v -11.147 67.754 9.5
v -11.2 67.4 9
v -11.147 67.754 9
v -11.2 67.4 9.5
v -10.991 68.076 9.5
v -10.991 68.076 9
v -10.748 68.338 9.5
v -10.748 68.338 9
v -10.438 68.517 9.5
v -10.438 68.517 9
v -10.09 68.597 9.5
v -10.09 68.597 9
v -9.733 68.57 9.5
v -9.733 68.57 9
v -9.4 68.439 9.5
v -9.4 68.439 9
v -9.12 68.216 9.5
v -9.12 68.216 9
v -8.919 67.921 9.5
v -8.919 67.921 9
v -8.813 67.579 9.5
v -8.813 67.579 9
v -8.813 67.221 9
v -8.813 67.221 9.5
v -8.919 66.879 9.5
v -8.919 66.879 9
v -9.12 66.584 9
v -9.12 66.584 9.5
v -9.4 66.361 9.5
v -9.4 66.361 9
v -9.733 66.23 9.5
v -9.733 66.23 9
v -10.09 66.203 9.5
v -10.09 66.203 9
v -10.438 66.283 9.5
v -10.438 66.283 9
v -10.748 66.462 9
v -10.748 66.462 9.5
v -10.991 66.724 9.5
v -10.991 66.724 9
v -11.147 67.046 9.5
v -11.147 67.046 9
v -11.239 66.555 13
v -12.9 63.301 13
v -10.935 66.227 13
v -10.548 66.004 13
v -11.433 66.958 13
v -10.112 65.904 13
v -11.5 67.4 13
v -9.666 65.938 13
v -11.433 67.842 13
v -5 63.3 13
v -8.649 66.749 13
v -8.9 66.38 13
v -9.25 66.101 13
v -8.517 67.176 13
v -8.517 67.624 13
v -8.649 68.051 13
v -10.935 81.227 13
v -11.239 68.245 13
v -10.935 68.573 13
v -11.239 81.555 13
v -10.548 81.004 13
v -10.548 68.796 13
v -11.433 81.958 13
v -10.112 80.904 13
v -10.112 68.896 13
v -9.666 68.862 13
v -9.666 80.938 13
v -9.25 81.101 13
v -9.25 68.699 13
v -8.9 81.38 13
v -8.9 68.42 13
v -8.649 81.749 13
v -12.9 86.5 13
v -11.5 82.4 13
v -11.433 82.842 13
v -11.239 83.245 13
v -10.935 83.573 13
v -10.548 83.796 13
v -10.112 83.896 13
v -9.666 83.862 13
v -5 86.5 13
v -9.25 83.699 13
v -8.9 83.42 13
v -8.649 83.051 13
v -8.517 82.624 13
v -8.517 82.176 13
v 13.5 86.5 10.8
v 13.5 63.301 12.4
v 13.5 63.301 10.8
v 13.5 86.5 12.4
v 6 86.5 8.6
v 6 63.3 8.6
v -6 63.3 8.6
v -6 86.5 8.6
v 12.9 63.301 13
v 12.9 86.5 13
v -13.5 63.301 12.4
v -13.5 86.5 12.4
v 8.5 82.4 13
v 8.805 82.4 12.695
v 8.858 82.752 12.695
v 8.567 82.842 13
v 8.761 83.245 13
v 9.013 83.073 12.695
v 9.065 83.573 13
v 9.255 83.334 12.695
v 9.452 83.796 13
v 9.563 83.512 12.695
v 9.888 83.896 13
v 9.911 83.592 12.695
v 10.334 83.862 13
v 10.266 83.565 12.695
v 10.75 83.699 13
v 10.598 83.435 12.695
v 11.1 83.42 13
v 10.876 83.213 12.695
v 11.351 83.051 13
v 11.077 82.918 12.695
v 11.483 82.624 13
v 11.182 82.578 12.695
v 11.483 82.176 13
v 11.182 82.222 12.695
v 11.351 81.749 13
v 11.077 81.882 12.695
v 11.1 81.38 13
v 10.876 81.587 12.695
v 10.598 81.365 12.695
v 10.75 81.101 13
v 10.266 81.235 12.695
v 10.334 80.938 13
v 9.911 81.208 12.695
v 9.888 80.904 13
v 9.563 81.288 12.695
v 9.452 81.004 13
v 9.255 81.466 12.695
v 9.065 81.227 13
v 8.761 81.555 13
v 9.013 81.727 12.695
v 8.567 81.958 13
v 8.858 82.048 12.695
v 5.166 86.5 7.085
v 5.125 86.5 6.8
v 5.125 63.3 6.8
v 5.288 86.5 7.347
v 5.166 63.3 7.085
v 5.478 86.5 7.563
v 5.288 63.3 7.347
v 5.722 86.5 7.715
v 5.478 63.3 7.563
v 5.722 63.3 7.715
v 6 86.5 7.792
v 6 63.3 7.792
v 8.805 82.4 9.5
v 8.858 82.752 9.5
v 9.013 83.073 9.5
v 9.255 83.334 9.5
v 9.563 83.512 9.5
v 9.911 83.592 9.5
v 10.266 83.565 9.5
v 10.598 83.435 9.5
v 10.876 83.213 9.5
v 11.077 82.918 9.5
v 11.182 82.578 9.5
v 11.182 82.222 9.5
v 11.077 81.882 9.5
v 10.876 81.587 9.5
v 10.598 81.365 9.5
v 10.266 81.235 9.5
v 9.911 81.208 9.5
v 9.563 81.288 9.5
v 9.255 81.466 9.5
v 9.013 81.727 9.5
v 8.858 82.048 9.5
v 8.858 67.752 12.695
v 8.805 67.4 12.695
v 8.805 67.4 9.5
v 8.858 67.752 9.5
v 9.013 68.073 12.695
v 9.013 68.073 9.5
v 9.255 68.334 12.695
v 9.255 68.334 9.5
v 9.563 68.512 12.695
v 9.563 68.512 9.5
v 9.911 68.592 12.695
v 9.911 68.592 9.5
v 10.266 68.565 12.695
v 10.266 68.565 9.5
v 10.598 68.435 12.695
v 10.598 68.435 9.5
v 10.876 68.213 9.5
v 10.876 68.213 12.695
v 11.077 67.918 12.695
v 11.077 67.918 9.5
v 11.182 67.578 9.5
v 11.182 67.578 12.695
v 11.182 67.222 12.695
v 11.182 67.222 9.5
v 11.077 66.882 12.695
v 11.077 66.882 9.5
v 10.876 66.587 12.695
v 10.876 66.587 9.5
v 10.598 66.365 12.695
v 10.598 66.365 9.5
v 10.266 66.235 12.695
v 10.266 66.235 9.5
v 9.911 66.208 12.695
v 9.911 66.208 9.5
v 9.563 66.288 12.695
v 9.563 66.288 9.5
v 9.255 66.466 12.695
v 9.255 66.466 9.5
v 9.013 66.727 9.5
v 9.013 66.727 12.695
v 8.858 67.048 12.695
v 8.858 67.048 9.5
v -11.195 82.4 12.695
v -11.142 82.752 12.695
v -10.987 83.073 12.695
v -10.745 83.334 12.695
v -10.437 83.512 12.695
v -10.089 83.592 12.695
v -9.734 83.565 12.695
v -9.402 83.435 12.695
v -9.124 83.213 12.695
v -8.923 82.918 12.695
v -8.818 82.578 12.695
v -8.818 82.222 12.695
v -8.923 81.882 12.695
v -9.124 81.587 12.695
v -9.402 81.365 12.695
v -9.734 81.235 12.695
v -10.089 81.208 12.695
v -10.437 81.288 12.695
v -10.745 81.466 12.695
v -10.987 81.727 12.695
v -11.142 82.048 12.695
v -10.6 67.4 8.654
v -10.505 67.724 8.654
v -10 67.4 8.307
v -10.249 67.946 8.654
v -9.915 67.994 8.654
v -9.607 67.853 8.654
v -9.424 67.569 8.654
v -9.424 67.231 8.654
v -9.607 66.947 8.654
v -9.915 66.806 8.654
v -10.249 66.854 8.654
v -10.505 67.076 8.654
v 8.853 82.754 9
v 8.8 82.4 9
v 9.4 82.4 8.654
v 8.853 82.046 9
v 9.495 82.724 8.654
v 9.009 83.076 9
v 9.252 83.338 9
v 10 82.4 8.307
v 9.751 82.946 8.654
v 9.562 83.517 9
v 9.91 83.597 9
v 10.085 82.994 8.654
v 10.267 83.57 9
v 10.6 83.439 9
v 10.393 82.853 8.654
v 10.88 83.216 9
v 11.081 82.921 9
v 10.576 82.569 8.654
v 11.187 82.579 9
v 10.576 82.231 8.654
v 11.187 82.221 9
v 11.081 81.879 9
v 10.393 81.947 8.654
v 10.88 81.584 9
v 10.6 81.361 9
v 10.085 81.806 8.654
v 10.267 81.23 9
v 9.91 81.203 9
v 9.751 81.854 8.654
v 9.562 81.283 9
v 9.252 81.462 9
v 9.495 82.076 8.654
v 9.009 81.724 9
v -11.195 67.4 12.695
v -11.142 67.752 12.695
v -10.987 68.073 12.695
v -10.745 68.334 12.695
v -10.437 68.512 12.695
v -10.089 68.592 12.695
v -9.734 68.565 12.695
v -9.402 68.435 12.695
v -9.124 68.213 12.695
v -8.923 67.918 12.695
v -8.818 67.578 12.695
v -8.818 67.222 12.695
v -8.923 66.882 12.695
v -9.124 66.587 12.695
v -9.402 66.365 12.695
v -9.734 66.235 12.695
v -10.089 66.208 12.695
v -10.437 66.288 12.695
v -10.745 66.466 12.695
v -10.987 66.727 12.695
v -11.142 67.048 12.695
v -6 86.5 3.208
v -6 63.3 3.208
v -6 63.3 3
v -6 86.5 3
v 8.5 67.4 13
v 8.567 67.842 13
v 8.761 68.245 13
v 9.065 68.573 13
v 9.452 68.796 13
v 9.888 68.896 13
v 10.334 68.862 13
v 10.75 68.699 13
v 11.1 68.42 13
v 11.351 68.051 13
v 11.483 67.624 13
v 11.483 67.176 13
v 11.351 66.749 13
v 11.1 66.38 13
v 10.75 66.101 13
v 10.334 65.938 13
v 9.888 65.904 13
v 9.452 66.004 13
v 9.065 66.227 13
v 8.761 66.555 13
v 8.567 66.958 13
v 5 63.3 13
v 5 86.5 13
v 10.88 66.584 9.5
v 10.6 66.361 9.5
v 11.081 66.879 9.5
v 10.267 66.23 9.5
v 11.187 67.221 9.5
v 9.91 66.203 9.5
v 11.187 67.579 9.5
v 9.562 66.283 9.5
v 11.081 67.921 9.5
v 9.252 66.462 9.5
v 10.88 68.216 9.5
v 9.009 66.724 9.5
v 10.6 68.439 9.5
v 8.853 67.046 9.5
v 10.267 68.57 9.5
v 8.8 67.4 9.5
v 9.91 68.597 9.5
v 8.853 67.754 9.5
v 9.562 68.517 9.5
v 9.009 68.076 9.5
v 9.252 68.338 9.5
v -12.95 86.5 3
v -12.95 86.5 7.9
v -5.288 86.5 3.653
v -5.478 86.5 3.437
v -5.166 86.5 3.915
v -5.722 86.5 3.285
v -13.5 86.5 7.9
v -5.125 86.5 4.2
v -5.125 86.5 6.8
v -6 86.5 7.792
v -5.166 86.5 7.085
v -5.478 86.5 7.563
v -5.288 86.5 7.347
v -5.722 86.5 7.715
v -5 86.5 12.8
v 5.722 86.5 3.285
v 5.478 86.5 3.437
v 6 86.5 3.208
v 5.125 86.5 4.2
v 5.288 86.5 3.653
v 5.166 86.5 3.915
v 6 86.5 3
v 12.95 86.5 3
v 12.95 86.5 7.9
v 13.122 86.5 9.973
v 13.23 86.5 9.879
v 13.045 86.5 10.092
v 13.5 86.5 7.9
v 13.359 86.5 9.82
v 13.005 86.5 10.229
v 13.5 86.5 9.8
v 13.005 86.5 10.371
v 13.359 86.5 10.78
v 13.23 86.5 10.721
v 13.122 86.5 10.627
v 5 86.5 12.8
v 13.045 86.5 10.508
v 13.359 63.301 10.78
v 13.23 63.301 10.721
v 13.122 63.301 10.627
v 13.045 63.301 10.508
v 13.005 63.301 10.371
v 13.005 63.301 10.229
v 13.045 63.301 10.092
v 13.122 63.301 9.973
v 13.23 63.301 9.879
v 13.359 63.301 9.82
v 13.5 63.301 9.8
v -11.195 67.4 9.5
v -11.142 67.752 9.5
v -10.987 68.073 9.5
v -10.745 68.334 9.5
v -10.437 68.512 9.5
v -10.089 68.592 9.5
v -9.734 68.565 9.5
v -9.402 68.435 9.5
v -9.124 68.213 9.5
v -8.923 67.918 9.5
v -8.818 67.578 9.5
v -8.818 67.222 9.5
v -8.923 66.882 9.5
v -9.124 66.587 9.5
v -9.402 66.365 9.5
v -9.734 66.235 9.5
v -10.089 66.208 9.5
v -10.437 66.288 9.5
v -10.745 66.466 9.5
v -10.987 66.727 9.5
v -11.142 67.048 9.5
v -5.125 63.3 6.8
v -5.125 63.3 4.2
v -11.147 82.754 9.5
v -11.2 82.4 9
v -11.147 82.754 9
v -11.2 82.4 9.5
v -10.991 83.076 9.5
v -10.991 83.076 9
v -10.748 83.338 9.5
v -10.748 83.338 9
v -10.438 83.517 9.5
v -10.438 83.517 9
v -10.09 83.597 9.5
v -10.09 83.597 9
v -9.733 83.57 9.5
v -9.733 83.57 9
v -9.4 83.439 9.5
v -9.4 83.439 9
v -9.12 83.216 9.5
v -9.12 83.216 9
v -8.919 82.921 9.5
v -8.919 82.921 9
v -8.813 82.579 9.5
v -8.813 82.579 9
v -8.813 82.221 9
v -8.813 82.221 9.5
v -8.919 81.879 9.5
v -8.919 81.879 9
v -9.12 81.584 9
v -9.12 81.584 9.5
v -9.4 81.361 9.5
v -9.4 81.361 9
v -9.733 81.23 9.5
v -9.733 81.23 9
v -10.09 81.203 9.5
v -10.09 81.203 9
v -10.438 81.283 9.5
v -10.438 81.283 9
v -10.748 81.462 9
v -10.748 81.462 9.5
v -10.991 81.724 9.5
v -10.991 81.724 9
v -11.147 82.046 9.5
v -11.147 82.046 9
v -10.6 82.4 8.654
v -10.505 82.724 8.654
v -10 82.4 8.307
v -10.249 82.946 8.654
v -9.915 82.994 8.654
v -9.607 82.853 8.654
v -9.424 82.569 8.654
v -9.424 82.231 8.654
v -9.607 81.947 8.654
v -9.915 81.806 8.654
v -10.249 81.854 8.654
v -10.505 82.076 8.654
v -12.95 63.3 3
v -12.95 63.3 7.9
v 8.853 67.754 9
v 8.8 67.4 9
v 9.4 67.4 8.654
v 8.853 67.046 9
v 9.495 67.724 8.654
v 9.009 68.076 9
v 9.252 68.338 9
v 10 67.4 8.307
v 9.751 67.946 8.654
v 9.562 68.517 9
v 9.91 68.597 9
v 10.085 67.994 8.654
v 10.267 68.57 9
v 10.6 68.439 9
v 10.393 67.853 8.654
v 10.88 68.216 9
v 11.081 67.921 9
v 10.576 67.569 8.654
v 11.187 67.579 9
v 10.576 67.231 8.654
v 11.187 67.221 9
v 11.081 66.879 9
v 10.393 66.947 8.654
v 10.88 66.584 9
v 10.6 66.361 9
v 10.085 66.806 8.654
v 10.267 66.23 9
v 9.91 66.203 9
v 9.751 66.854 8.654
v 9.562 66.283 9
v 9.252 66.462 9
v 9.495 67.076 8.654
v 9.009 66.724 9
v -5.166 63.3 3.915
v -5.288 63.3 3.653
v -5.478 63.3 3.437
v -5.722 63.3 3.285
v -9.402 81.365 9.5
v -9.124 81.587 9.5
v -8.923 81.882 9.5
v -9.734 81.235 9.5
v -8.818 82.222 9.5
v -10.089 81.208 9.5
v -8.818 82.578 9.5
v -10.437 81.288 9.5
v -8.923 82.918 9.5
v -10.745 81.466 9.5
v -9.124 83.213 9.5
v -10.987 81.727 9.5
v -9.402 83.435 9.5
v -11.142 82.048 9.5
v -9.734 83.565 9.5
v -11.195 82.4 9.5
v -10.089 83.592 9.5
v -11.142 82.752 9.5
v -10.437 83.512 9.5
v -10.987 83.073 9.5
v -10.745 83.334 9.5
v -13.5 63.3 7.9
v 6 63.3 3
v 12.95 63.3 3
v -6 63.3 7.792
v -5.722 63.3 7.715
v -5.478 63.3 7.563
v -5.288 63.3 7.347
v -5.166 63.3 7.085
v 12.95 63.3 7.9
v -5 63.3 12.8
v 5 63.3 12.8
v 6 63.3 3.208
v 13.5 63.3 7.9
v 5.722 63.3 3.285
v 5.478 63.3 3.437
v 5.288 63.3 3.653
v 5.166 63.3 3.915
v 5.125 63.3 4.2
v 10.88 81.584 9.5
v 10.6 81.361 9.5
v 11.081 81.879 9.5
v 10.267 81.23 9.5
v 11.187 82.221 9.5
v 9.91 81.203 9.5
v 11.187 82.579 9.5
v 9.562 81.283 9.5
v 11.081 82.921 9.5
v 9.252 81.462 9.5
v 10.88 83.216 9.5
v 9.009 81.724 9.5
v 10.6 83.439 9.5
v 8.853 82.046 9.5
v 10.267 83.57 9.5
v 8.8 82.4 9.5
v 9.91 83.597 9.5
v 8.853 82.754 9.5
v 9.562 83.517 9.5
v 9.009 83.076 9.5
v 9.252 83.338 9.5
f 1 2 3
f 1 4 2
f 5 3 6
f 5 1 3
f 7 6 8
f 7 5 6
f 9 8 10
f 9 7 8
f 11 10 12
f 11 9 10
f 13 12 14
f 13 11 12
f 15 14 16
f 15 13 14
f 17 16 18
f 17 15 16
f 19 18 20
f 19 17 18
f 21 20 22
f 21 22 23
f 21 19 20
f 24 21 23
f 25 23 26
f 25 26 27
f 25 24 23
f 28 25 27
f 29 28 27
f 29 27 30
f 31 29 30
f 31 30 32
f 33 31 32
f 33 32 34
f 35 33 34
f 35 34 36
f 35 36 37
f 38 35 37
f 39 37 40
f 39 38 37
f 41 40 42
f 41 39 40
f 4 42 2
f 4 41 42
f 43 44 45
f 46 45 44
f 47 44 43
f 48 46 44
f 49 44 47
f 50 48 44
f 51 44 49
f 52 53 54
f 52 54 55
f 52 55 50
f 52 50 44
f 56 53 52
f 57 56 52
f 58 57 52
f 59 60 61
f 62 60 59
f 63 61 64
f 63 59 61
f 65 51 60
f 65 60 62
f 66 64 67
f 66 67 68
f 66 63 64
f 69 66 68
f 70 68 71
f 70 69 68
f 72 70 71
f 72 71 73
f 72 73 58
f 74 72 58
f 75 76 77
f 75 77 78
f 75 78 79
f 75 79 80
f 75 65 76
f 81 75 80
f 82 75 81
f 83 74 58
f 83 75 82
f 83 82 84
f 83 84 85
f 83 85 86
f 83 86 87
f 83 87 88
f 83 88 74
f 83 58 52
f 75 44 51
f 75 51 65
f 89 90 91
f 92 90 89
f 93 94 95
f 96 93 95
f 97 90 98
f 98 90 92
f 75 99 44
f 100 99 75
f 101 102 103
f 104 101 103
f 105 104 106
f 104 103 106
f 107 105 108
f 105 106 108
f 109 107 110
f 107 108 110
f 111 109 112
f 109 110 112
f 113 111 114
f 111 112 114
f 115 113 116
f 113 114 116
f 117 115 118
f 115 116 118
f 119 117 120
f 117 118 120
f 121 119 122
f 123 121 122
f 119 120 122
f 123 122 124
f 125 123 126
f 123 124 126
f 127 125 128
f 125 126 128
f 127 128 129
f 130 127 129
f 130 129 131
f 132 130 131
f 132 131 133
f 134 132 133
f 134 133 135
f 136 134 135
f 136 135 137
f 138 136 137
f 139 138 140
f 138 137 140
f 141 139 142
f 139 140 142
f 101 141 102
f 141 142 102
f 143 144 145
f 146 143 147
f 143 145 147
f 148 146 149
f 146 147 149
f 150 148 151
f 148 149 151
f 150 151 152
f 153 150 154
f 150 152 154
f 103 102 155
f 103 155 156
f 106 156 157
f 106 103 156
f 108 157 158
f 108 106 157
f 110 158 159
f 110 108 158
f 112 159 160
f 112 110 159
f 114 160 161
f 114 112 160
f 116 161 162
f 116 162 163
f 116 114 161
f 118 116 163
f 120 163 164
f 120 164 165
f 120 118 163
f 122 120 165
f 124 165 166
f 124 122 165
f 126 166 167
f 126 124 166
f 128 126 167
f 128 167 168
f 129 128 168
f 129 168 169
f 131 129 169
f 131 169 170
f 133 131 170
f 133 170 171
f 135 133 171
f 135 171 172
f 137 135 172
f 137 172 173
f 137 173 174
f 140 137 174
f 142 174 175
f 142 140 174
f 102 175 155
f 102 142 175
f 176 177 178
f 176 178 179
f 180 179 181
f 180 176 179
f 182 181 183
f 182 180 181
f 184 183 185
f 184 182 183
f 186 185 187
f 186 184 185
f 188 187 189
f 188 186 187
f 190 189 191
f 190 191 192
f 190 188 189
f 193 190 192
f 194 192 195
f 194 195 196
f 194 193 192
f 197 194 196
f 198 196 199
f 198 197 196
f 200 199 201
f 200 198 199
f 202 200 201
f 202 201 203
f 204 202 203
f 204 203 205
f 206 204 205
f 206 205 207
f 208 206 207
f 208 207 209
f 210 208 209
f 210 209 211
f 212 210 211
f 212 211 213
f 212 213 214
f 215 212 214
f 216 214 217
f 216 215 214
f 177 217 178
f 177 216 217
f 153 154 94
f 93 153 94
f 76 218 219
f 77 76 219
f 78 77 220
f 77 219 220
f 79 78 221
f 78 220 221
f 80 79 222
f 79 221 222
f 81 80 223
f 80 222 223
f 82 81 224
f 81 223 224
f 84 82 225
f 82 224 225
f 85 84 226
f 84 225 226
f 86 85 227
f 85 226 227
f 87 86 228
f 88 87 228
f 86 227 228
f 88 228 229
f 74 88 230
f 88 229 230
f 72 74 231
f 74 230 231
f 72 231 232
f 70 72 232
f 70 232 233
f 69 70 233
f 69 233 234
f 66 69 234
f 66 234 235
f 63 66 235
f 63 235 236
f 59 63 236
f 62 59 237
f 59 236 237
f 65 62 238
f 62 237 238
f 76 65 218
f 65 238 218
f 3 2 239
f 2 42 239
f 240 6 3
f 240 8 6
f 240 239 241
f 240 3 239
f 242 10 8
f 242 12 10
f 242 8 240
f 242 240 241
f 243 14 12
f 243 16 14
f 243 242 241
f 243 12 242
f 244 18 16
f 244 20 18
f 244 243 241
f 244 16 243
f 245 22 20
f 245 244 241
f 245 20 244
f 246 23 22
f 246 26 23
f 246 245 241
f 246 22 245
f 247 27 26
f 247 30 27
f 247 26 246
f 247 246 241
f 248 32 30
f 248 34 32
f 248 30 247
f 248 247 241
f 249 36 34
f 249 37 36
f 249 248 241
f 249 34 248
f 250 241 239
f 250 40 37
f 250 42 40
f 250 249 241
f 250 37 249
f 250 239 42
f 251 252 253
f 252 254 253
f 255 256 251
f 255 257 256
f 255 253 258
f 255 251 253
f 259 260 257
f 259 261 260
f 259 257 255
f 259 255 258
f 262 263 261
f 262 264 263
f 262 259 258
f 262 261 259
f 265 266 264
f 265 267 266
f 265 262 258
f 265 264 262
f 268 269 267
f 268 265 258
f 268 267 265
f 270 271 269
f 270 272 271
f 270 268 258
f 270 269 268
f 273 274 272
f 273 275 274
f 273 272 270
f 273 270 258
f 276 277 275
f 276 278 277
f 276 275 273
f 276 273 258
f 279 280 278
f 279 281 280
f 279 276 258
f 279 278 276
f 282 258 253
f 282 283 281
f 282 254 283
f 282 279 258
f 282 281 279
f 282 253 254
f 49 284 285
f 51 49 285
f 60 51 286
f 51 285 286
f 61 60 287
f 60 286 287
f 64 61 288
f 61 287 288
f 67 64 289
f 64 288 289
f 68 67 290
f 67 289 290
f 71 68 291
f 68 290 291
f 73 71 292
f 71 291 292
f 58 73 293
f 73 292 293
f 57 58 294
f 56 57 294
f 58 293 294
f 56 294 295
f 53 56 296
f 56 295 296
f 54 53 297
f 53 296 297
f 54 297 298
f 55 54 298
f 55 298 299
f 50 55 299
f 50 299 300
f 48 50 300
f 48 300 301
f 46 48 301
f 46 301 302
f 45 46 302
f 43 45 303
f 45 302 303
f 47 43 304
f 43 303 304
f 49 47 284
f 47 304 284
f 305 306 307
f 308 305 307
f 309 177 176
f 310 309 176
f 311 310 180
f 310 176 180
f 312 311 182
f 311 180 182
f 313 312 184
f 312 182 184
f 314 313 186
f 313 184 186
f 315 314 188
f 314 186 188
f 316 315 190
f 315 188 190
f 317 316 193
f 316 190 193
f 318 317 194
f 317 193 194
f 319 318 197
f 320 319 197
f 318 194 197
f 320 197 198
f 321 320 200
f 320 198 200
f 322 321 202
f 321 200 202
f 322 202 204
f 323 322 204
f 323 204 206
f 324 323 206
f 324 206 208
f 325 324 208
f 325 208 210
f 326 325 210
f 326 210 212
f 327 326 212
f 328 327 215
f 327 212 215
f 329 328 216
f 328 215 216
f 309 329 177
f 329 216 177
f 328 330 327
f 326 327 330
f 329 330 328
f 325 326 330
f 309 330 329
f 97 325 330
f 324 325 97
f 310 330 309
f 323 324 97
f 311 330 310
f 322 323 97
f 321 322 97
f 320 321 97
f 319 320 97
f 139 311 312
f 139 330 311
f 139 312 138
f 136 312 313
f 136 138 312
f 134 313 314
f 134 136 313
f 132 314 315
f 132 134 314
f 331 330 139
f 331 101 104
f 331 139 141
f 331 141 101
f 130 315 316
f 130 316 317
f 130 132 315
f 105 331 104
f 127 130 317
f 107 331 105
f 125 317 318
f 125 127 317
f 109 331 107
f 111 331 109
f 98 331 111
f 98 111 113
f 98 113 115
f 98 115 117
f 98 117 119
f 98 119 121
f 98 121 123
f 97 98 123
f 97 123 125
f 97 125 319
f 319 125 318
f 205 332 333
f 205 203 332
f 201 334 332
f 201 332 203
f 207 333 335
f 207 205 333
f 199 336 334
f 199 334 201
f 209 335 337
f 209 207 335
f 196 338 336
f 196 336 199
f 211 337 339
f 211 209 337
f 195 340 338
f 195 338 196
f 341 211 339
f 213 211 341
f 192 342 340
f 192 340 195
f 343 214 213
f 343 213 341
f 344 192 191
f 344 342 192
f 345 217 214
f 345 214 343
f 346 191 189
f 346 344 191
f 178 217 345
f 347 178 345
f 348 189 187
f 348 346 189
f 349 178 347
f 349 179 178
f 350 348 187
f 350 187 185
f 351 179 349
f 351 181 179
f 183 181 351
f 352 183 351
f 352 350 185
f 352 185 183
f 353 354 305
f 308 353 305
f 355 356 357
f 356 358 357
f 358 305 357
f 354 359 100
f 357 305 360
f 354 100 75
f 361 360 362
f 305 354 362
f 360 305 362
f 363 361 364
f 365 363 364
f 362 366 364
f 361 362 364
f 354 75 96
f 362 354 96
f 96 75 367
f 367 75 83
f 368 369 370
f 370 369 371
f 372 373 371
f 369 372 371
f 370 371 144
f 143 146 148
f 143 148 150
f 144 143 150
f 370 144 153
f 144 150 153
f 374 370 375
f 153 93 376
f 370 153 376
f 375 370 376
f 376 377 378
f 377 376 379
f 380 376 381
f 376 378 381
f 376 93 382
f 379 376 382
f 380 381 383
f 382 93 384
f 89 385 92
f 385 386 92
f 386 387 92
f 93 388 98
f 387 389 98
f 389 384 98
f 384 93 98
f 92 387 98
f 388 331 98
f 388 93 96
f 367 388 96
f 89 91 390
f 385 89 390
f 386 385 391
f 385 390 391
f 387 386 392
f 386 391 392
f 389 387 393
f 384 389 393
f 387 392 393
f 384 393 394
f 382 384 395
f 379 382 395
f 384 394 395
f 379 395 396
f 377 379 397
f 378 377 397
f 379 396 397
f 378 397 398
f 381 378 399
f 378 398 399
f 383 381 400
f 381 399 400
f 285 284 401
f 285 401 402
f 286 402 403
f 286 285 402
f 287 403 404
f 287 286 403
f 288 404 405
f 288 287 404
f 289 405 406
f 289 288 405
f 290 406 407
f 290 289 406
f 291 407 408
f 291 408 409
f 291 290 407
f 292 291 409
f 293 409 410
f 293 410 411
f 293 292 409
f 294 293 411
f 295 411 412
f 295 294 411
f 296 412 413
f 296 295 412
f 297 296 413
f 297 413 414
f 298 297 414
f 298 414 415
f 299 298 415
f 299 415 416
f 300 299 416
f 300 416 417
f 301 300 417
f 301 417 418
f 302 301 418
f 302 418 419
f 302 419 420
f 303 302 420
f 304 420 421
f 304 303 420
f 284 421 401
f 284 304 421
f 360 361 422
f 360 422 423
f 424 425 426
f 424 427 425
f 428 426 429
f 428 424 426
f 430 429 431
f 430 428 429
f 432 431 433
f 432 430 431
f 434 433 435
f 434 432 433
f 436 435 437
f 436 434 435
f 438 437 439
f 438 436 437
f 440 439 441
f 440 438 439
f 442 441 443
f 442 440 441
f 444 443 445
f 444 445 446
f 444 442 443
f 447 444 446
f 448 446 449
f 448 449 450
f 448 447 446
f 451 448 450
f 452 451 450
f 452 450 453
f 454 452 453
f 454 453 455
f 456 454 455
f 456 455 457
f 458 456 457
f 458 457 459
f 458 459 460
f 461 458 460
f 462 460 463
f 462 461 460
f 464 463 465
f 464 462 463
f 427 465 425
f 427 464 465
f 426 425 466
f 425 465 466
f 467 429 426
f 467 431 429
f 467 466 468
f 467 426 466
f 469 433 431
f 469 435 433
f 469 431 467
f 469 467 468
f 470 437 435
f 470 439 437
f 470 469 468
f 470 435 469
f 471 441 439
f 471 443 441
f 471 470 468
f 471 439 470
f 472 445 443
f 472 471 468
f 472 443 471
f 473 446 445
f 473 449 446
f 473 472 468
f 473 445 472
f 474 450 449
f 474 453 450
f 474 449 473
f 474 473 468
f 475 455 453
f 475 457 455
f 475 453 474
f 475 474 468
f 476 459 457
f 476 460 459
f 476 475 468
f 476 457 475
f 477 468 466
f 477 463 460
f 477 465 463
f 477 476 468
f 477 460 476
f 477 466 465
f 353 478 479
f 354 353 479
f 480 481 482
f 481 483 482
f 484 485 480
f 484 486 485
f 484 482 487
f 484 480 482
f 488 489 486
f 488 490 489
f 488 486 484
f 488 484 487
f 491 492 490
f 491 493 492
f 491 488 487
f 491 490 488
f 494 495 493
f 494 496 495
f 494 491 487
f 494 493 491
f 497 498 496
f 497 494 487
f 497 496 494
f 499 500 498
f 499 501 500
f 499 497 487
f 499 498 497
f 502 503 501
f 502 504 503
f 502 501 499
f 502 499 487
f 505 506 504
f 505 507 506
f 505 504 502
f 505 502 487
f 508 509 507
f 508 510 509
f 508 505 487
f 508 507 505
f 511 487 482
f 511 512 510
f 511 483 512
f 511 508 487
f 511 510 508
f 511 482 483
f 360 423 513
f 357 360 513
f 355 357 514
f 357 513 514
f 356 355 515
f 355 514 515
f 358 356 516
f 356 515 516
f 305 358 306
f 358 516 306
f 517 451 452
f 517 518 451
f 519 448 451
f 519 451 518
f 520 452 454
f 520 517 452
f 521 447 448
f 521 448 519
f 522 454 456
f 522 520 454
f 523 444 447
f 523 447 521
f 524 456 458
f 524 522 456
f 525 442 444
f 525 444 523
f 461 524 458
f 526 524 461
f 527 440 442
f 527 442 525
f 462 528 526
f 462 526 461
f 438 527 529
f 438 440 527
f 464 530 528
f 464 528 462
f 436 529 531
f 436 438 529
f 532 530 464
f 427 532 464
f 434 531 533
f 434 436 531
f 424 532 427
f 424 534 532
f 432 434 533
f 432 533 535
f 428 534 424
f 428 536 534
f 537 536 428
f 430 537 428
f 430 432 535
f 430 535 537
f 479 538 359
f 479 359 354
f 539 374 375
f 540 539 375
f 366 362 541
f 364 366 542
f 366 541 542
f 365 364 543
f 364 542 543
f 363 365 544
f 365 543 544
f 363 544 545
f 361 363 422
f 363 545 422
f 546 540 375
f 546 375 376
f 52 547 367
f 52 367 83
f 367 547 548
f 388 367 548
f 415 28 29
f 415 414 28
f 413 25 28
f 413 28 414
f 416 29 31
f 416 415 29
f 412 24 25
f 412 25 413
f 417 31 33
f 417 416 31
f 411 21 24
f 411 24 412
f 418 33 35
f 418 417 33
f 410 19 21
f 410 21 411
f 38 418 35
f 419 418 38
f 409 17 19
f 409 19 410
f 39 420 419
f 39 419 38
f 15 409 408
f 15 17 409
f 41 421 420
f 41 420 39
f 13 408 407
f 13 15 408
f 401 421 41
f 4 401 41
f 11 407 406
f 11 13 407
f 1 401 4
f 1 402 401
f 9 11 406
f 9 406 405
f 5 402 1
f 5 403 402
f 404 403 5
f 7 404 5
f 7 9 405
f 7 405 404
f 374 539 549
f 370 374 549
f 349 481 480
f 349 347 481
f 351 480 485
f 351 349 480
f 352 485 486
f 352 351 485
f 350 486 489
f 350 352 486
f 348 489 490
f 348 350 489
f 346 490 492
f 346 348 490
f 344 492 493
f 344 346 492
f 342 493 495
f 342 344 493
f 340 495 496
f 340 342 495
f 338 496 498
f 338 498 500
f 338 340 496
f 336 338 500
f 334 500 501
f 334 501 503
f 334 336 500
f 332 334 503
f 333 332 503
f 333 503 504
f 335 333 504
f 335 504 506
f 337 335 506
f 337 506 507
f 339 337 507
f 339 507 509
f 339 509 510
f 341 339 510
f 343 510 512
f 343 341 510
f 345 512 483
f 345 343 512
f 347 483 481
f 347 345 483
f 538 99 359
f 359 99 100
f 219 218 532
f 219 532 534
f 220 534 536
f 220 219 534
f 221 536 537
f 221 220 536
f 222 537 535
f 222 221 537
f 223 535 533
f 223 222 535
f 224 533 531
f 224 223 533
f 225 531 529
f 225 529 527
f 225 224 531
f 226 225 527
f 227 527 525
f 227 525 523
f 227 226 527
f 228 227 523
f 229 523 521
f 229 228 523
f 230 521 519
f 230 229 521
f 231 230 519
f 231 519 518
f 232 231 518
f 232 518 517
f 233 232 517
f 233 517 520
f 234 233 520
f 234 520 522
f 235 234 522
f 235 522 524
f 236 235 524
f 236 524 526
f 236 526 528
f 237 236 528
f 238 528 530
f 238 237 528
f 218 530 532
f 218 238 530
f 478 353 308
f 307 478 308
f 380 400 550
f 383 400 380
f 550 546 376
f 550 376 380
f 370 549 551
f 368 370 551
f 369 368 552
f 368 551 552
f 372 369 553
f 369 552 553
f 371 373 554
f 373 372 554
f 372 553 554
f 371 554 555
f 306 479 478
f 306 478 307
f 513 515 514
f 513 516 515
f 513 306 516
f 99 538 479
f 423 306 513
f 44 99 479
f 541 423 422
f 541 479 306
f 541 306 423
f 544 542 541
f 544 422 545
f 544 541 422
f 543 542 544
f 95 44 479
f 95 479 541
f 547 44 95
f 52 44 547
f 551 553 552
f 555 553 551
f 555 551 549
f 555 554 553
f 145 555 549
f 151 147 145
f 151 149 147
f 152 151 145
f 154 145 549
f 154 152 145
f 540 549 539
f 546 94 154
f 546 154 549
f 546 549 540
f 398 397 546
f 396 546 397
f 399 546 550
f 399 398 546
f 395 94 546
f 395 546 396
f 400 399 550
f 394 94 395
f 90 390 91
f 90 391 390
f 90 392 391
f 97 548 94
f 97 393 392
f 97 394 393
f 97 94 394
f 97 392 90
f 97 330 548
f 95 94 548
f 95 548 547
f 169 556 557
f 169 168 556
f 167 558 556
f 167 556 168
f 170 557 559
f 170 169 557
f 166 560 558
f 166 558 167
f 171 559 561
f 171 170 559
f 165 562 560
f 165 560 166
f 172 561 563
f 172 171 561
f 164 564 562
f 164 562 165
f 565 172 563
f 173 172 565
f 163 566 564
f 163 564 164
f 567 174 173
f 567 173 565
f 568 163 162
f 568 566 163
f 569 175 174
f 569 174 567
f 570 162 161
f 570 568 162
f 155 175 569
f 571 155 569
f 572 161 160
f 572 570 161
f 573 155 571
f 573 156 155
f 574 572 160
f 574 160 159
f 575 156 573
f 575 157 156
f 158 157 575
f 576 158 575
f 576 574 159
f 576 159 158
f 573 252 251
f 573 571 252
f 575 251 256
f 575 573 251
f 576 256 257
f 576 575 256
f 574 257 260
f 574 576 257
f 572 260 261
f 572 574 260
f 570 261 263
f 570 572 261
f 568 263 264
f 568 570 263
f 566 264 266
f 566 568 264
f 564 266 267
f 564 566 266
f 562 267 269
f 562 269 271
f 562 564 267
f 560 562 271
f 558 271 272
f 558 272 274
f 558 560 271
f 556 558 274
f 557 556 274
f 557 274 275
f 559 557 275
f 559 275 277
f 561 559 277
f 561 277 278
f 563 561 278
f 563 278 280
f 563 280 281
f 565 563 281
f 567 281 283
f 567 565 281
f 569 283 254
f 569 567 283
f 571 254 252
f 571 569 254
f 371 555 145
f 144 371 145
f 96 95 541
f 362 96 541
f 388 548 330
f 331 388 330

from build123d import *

# Parameters (mm, degrees)
CROQUIS1_W                    = 27
CROQUIS1_H                    = 23.199
SALIENTE_EXTRUIR1_DEPTH       = 10
CORTAR_EXTRUIR1_DEPTH         = 30.823541054
CROQUIS3_W                    = 0.55
CROQUIS3_H                    = 4.9
CORTAR_EXTRUIR2_DEPTH         = 30.823541054
CORTAR_EXTRUIR3_DEPTH         = 30.823541054
CORTAR_EXTRUIR4_DEPTH         = 23.199
CROQUIS6_W                    = 0.55
CROQUIS6_H                    = 4.9
CORTAR_EXTRUIR5_DEPTH         = 30.823541054
CROQUIS7_W                    = 10
CROQUIS7_H                    = 0.2
CORTAR_EXTRUIR6_DEPTH         = 30.823541054
DI_METRO_DE_TALADRO_1_0_1_1_D = 1
CHAFL_N1_SIZE                 = 0.305
CHAFL_N2_SIZE                 = 0.6


with BuildPart() as part:
    # Croquis1 → Saliente-Extruir1 (new body)
    with BuildSketch(Plane.XY.offset(13)):
        with Locations((0, 74.9)):
            Rectangle(CROQUIS1_W, CROQUIS1_H)
    extrude(amount=-SALIENTE_EXTRUIR1_DEPTH)

    # Croquis2 → Cortar-Extruir1 (cut, through all)
    with BuildSketch(Plane.XZ.offset(-63.3005)):
        with BuildLine():
            Line((-5.125, 3), (5.125, 3))
            Line((5.125, 3), (5.125, 6.799999997))
            ThreePointArc((5.125, 6.799999997), (5.375, 7.461437825), (6, 7.79215674))
            Line((6, 7.79215674), (6, 8.6))
            Line((6, 8.6), (-6, 8.6))
            Line((-6, 8.6), (-6, 7.79215674))
            ThreePointArc((-6, 7.79215674), (-5.375, 7.461437828), (-5.125, 6.800000001))
            Line((-5.125, 6.800000001), (-5.125, 3))
        make_face()
    extrude(amount=-CORTAR_EXTRUIR1_DEPTH, mode=Mode.SUBTRACT)

    # Croquis3 → Cortar-Extruir2 (cut, through all)
    with BuildSketch(Plane.XZ.offset(-63.3005)):
        with Locations((13.225, 5.45)):
            Rectangle(CROQUIS3_W, CROQUIS3_H)
    extrude(amount=-CORTAR_EXTRUIR2_DEPTH, mode=Mode.SUBTRACT)

    # Croquis4 → Cortar-Extruir3 (cut, through all)
    with BuildSketch(Plane.XZ.offset(-63.3005)):
        with BuildLine():
            Line((5.125, 4.199999999), (5.125, 3))
            Line((5.125, 3), (6, 3))
            Line((6, 3), (6, 3.20784326))
            ThreePointArc((6, 3.20784326), (5.375, 3.538562172), (5.125, 4.199999999))
        make_face()
    extrude(amount=-CORTAR_EXTRUIR3_DEPTH, mode=Mode.SUBTRACT)

    # Croquis5 → Cortar-Extruir4 (cut)
    with BuildSketch(Plane.XZ.offset(-63.3005)):
        with BuildLine():
            Line((-6, 3.20784326), (-6, 3))
            Line((-6, 3), (-5.125, 3))
            Line((-5.125, 3), (-5.125, 4.200000003))
            ThreePointArc((-5.125, 4.200000003), (-5.375, 3.538562175), (-6, 3.20784326))
        make_face()
    extrude(amount=-CORTAR_EXTRUIR4_DEPTH, mode=Mode.SUBTRACT)

    # Croquis6 → Cortar-Extruir5 (cut, through all)
    with BuildSketch(Plane.XZ.offset(-63.3005)):
        with Locations((-13.225, 5.45)):
            Rectangle(CROQUIS6_W, CROQUIS6_H)
    extrude(amount=-CORTAR_EXTRUIR5_DEPTH, mode=Mode.SUBTRACT)

    # Croquis7 → Cortar-Extruir6 (cut, through all)
    with BuildSketch(Plane.XZ.offset(-63.3005)):
        with Locations((0, 12.9)):
            Rectangle(CROQUIS7_W, CROQUIS7_H)
    extrude(amount=-CORTAR_EXTRUIR6_DEPTH, mode=Mode.SUBTRACT)

    # Croquis8 → Cortar-Revolución1 (revolve, cut)
    with BuildSketch(Plane.XZ.offset(-67.4), mode=Mode.PRIVATE) as cortar_revoluci_n1_sk:
        Polygon((-8.805, 13), (-10, 13), (-10, 8.307179677), (-8.8, 9), (-8.8, 9.5), (-8.805, 9.5), align=None)
    revolve(cortar_revoluci_n1_sk.sketch.rotate(Axis((-10, 67.4, 13.000025), (0, 0, -1)), 180), axis=Axis((-10, 67.4, 13.000025), (0, 0, -1)), mode=Mode.SUBTRACT)

    # Croquis9 → Cortar-Revolución2 (revolve, cut)
    with BuildSketch(Plane.XZ.offset(-82.4), mode=Mode.PRIVATE) as cortar_revoluci_n2_sk:
        Polygon((-8.805, 13), (-10, 13), (-10, 8.307179677), (-8.8, 9), (-8.8, 9.5), (-8.805, 9.5), align=None)
    revolve(cortar_revoluci_n2_sk.sketch.rotate(Axis((-10, 82.4, 13.000025), (0, 0, -1)), 180), axis=Axis((-10, 82.4, 13.000025), (0, 0, -1)), mode=Mode.SUBTRACT)

    # Croquis10 → Cortar-Revolución3 (revolve, cut)
    with BuildSketch(Plane.XZ.offset(-67.4), mode=Mode.PRIVATE) as cortar_revoluci_n3_sk:
        Polygon((11.195, 13), (10, 13), (10, 8.307179677), (11.2, 9), (11.2, 9.5), (11.195, 9.5), align=None)
    revolve(cortar_revoluci_n3_sk.sketch.rotate(Axis((10, 67.4, 13.000025), (0, 0, -1)), 180), axis=Axis((10, 67.4, 13.000025), (0, 0, -1)), mode=Mode.SUBTRACT)

    # Croquis11 → Cortar-Revolución4 (revolve, cut)
    with BuildSketch(Plane.XZ.offset(-82.4), mode=Mode.PRIVATE) as cortar_revoluci_n4_sk:
        Polygon((11.195, 13), (10, 13), (10, 8.307179677), (11.2, 9), (11.2, 9.5), (11.195, 9.5), align=None)
    revolve(cortar_revoluci_n4_sk.sketch.rotate(Axis((10, 82.4, 13.000025), (0, 0, -1)), 180), axis=Axis((10, 82.4, 13.000025), (0, 0, -1)), mode=Mode.SUBTRACT)

    # Diámetro de taladro Ø1.0 (1)1 (through all)
    with Locations(Plane(origin=(0, 86.4995, 0), x_dir=(-1, 0, 0), z_dir=(0, 1, 0))):
        with Locations((-13.5, 10.3)):
            Hole(DI_METRO_DE_TALADRO_1_0_1_1_D / 2)

    # Chaflán1
    chafl_n1_edges = [part.edges().sort_by_distance(p)[0] for p in [
        (-8.805, 67.4, 13),
        (-8.805, 82.4, 13),
        (11.195, 67.4, 13),
        (11.195, 82.4, 13),
    ]]
    chamfer(chafl_n1_edges, length=CHAFL_N1_SIZE)

    # Chaflán2
    chafl_n2_edges = [part.edges().sort_by_distance(p)[0] for p in [
        (13.5, 74.9, 13),
        (-13.5, 74.9, 13),
    ]]
    chamfer(chafl_n2_edges, length=CHAFL_N2_SIZE)


solid = part.part
